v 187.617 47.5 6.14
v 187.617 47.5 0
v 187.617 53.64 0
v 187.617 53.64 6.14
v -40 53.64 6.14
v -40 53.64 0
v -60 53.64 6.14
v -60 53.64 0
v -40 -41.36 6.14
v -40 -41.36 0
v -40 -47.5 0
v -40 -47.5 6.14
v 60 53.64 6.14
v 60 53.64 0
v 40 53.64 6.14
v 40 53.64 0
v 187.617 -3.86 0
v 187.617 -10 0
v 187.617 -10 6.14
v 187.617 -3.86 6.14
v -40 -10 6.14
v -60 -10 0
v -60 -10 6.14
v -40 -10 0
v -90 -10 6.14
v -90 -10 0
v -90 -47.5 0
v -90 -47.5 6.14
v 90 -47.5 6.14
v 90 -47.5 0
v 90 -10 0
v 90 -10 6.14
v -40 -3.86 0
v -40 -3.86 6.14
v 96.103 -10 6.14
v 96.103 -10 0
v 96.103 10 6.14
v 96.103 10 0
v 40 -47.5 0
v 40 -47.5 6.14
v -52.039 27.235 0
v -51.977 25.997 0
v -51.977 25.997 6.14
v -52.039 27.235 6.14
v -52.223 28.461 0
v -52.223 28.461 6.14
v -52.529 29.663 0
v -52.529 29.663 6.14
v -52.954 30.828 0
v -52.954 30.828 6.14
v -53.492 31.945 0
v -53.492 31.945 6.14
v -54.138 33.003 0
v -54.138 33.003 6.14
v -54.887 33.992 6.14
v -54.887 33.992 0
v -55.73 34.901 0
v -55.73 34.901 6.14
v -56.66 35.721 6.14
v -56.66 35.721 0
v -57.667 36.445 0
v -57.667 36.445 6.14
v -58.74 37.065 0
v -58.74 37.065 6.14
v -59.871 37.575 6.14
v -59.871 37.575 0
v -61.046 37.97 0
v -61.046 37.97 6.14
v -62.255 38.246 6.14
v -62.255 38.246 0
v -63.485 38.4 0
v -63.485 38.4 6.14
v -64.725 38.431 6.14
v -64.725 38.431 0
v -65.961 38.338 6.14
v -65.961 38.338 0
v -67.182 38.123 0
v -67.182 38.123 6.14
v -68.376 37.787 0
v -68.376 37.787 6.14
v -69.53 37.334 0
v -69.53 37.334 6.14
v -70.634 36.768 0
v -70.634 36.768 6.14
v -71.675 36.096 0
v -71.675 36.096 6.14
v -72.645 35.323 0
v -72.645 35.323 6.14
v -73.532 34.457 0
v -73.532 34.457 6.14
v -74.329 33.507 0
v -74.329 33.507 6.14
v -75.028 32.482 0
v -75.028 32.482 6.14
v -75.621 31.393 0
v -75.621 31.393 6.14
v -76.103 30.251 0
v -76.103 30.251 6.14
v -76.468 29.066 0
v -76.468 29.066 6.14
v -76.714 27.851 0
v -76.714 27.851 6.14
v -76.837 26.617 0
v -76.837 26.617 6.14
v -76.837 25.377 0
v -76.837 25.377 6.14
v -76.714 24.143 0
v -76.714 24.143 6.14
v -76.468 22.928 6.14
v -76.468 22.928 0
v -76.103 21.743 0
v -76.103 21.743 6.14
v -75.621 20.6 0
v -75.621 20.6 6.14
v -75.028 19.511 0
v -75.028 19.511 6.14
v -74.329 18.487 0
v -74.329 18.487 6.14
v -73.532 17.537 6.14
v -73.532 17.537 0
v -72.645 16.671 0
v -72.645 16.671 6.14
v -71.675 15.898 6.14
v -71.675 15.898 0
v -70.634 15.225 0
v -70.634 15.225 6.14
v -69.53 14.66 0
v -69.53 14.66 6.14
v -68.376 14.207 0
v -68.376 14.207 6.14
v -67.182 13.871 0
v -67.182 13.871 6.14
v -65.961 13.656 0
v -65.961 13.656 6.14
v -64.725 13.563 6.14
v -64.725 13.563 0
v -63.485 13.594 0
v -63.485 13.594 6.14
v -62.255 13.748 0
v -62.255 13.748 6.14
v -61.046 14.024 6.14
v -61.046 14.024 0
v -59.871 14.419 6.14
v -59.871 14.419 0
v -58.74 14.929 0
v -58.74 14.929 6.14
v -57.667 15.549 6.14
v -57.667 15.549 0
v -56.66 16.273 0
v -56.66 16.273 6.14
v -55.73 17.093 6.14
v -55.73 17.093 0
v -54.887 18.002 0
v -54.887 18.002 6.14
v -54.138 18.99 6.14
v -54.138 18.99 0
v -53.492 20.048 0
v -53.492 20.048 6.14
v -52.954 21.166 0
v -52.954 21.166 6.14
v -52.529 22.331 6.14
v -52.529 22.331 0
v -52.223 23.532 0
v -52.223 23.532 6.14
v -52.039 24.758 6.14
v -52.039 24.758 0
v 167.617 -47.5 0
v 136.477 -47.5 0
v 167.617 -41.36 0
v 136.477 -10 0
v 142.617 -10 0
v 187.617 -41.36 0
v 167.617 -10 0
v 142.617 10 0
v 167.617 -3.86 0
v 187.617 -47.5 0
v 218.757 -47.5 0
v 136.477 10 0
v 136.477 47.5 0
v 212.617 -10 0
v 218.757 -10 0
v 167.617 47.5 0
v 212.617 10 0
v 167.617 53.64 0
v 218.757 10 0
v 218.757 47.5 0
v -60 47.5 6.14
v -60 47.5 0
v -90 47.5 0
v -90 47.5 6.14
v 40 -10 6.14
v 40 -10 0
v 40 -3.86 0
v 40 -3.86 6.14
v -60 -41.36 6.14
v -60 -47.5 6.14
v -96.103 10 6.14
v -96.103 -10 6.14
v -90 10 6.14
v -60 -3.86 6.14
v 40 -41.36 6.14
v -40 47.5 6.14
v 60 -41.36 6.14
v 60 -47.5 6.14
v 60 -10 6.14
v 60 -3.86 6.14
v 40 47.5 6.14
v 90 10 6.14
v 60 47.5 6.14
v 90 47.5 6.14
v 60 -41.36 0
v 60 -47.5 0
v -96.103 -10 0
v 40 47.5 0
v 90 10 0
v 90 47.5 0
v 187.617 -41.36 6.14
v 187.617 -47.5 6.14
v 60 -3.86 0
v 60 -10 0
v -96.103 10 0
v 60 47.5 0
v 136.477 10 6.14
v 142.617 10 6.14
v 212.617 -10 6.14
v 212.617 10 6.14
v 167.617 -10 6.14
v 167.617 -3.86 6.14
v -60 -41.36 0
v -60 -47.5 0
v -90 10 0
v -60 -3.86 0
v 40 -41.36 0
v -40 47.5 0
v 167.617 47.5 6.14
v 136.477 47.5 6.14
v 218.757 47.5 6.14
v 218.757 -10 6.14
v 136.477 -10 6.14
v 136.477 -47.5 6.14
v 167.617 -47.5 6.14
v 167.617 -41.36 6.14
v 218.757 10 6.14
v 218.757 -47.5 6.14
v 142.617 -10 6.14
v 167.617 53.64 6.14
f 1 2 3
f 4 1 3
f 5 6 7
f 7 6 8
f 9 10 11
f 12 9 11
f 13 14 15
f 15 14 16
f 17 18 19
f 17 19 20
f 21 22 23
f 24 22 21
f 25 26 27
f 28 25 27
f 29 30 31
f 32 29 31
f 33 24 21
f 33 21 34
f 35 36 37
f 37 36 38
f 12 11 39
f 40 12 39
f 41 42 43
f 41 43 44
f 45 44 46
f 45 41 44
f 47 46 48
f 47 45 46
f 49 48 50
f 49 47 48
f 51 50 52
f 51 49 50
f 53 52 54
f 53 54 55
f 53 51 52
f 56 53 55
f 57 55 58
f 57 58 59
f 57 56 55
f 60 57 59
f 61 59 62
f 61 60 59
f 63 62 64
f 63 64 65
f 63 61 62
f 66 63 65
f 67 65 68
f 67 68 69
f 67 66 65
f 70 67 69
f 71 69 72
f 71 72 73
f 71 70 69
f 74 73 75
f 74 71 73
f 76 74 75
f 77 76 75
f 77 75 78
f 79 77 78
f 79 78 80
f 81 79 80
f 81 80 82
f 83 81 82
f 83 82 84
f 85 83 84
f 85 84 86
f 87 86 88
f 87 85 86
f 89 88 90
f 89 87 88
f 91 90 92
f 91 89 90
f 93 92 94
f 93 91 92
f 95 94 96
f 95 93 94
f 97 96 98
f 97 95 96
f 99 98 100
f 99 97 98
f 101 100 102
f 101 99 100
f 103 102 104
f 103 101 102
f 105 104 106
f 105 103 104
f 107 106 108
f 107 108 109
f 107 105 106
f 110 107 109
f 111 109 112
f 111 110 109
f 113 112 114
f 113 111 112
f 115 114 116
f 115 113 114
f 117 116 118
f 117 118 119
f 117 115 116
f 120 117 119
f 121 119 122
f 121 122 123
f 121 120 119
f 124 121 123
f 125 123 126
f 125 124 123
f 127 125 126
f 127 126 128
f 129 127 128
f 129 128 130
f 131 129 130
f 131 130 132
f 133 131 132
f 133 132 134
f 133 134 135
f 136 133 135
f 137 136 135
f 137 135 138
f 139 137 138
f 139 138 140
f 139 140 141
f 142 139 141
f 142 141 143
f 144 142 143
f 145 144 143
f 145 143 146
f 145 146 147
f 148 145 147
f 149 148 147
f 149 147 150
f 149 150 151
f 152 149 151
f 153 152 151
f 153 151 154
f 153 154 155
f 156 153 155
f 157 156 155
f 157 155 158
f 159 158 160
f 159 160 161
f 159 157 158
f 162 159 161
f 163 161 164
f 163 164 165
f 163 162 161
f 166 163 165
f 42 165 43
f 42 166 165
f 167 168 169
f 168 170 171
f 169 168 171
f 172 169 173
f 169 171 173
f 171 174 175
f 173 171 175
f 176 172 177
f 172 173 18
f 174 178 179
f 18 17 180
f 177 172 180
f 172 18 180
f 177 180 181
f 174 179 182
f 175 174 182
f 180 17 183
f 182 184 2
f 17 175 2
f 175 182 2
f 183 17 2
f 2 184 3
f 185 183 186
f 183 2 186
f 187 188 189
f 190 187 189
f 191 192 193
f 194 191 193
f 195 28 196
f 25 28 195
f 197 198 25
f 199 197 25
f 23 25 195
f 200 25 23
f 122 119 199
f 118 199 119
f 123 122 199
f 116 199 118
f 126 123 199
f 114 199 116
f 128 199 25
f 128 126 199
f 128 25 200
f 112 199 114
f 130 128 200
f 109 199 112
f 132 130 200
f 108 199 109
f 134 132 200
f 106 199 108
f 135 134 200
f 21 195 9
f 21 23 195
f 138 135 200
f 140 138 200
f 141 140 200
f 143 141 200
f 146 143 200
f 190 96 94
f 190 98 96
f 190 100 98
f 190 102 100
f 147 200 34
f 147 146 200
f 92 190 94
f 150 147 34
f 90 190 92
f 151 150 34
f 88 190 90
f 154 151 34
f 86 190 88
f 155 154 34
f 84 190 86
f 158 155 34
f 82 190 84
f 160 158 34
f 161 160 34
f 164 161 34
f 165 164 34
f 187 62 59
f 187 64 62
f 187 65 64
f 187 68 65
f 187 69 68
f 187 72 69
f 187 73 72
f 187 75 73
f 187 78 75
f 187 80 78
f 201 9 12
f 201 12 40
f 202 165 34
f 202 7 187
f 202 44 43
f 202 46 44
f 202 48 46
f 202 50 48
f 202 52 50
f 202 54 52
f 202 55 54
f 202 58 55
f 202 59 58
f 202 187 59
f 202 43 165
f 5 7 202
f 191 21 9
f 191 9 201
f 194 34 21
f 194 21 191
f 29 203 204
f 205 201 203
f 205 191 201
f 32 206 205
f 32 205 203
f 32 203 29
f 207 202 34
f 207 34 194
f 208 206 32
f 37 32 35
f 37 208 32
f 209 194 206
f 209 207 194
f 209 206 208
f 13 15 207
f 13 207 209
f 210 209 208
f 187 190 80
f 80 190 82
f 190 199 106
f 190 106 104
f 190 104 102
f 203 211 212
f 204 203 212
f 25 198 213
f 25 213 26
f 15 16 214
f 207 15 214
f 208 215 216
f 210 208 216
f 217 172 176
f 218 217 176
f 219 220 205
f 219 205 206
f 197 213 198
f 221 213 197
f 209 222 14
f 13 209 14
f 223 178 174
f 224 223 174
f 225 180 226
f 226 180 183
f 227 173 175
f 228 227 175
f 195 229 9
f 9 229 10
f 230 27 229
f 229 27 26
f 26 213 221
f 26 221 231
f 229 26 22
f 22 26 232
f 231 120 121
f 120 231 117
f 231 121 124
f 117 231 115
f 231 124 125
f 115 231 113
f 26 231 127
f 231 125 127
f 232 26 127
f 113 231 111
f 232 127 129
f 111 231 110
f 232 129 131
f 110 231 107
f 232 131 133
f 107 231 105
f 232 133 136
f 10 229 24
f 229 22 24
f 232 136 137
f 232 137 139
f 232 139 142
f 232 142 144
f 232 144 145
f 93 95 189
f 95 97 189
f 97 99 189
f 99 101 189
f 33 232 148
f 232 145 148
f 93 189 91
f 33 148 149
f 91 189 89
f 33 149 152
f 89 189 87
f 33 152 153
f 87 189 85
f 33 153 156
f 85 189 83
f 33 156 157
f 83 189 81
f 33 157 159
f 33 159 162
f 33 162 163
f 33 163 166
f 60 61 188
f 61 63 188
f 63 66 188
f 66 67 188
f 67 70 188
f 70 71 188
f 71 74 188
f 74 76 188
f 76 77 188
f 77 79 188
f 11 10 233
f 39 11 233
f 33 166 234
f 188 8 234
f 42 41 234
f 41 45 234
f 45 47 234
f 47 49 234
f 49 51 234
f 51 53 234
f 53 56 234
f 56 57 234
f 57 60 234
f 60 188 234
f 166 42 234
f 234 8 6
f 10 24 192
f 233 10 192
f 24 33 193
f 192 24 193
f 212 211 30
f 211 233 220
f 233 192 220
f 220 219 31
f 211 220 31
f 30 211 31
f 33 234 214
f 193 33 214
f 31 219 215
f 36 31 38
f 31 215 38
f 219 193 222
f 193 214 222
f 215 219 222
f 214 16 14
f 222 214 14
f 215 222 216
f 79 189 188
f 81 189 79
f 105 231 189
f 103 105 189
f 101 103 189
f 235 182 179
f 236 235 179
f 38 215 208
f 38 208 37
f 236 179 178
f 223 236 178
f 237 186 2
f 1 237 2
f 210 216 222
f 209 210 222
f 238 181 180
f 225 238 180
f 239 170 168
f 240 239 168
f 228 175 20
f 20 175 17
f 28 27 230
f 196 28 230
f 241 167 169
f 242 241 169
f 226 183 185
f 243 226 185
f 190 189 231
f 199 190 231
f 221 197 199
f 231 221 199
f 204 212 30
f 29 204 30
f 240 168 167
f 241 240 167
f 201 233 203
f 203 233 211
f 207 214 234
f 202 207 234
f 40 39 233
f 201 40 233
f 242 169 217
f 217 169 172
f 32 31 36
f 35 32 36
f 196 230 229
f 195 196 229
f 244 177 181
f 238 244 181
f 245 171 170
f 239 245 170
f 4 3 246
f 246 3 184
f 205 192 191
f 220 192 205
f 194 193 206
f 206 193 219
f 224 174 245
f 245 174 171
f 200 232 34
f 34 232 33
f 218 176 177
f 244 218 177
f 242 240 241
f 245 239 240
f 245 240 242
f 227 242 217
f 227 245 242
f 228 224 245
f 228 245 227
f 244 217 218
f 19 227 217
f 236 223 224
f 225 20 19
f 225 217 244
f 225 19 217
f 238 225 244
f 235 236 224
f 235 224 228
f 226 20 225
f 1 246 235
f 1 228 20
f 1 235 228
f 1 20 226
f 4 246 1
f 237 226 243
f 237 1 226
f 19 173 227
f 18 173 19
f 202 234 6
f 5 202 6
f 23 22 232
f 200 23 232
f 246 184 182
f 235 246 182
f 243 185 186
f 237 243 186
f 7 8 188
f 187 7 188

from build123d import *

# Parameters (mm, degrees)
F1_W     = 20
F1_H     = 6.14
F1_R     = 12.4378806179
F1_W_2   = 6.103127097
F1_H_2   = 20
F1_W_3   = 6.102888166
F2_DEPTH = 6.14
F3_DEPTH = 6.14


# Not quite as in the source:
# - a feature names something its author has since deleted; it is built from what else it names


with BuildPart() as f2:
    # F1 (on Top) → F2 (new body)
    with BuildSketch(Plane.XY):
        Polygon((-90.0001194655, -10), (-90.0001194655, -47.5), (-60, -47.5), (-60, -41.36), (-40, -41.36), (-40, -47.5), (40, -47.5), (40, -41.36), (60, -41.36), (60, -47.5), (89.9998805345, -47.5), (89.9998805345, -10), (89.9998805345, 10), (89.9998805345, 47.5), (60, 47.5), (60, 53.64), (40, 53.64), (40, 47.5), (-40, 47.5), (-40, 53.64), (-60, 53.64), (-60, 47.5), (-90.0001194655, 47.5), (-90.0001194655, 10), align=None)
        with Locations((-50, -6.93)):
            Rectangle(F1_W, F1_H, mode=Mode.SUBTRACT)
        with Locations((50, -6.93)):
            Rectangle(F1_W, F1_H, mode=Mode.SUBTRACT)
        with Locations((-64.4147619605, 25.9968824685)):
            Circle(F1_R, mode=Mode.SUBTRACT)
        with Locations((93.051444083, 0)):
            Rectangle(F1_W_2, F1_H_2)
        with Locations((-93.0515635485, 0)):
            Rectangle(F1_W_3, F1_H_2)
    extrude(amount=F2_DEPTH)


with BuildPart() as f3:
    # F1 (on Top) → F3 (new body)
    with BuildSketch(Plane.XY):
        Polygon((218.7568147469, -10), (212.6168147469, -10), (212.6168147469, 10), (218.7568147469, 10), (218.7568147469, 47.5), (187.6168147469, 47.5), (187.6168147469, 53.64), (167.6168147469, 53.64), (167.6168147469, 47.5), (136.4768147469, 47.5), (136.4768147469, 10), (142.6168147469, 10), (142.6168147469, -10), (136.4768147469, -10), (136.4768147469, -47.5), (167.6168147469, -47.5), (167.6168147469, -41.36), (187.6168147469, -41.36), (187.6168147469, -47.5), (218.7568147469, -47.5), align=None)
        with Locations((177.6168147469, -6.93)):
            Rectangle(F1_W, F1_H, mode=Mode.SUBTRACT)
    extrude(amount=F3_DEPTH)


solid = Compound([f2.part, f3.part])
